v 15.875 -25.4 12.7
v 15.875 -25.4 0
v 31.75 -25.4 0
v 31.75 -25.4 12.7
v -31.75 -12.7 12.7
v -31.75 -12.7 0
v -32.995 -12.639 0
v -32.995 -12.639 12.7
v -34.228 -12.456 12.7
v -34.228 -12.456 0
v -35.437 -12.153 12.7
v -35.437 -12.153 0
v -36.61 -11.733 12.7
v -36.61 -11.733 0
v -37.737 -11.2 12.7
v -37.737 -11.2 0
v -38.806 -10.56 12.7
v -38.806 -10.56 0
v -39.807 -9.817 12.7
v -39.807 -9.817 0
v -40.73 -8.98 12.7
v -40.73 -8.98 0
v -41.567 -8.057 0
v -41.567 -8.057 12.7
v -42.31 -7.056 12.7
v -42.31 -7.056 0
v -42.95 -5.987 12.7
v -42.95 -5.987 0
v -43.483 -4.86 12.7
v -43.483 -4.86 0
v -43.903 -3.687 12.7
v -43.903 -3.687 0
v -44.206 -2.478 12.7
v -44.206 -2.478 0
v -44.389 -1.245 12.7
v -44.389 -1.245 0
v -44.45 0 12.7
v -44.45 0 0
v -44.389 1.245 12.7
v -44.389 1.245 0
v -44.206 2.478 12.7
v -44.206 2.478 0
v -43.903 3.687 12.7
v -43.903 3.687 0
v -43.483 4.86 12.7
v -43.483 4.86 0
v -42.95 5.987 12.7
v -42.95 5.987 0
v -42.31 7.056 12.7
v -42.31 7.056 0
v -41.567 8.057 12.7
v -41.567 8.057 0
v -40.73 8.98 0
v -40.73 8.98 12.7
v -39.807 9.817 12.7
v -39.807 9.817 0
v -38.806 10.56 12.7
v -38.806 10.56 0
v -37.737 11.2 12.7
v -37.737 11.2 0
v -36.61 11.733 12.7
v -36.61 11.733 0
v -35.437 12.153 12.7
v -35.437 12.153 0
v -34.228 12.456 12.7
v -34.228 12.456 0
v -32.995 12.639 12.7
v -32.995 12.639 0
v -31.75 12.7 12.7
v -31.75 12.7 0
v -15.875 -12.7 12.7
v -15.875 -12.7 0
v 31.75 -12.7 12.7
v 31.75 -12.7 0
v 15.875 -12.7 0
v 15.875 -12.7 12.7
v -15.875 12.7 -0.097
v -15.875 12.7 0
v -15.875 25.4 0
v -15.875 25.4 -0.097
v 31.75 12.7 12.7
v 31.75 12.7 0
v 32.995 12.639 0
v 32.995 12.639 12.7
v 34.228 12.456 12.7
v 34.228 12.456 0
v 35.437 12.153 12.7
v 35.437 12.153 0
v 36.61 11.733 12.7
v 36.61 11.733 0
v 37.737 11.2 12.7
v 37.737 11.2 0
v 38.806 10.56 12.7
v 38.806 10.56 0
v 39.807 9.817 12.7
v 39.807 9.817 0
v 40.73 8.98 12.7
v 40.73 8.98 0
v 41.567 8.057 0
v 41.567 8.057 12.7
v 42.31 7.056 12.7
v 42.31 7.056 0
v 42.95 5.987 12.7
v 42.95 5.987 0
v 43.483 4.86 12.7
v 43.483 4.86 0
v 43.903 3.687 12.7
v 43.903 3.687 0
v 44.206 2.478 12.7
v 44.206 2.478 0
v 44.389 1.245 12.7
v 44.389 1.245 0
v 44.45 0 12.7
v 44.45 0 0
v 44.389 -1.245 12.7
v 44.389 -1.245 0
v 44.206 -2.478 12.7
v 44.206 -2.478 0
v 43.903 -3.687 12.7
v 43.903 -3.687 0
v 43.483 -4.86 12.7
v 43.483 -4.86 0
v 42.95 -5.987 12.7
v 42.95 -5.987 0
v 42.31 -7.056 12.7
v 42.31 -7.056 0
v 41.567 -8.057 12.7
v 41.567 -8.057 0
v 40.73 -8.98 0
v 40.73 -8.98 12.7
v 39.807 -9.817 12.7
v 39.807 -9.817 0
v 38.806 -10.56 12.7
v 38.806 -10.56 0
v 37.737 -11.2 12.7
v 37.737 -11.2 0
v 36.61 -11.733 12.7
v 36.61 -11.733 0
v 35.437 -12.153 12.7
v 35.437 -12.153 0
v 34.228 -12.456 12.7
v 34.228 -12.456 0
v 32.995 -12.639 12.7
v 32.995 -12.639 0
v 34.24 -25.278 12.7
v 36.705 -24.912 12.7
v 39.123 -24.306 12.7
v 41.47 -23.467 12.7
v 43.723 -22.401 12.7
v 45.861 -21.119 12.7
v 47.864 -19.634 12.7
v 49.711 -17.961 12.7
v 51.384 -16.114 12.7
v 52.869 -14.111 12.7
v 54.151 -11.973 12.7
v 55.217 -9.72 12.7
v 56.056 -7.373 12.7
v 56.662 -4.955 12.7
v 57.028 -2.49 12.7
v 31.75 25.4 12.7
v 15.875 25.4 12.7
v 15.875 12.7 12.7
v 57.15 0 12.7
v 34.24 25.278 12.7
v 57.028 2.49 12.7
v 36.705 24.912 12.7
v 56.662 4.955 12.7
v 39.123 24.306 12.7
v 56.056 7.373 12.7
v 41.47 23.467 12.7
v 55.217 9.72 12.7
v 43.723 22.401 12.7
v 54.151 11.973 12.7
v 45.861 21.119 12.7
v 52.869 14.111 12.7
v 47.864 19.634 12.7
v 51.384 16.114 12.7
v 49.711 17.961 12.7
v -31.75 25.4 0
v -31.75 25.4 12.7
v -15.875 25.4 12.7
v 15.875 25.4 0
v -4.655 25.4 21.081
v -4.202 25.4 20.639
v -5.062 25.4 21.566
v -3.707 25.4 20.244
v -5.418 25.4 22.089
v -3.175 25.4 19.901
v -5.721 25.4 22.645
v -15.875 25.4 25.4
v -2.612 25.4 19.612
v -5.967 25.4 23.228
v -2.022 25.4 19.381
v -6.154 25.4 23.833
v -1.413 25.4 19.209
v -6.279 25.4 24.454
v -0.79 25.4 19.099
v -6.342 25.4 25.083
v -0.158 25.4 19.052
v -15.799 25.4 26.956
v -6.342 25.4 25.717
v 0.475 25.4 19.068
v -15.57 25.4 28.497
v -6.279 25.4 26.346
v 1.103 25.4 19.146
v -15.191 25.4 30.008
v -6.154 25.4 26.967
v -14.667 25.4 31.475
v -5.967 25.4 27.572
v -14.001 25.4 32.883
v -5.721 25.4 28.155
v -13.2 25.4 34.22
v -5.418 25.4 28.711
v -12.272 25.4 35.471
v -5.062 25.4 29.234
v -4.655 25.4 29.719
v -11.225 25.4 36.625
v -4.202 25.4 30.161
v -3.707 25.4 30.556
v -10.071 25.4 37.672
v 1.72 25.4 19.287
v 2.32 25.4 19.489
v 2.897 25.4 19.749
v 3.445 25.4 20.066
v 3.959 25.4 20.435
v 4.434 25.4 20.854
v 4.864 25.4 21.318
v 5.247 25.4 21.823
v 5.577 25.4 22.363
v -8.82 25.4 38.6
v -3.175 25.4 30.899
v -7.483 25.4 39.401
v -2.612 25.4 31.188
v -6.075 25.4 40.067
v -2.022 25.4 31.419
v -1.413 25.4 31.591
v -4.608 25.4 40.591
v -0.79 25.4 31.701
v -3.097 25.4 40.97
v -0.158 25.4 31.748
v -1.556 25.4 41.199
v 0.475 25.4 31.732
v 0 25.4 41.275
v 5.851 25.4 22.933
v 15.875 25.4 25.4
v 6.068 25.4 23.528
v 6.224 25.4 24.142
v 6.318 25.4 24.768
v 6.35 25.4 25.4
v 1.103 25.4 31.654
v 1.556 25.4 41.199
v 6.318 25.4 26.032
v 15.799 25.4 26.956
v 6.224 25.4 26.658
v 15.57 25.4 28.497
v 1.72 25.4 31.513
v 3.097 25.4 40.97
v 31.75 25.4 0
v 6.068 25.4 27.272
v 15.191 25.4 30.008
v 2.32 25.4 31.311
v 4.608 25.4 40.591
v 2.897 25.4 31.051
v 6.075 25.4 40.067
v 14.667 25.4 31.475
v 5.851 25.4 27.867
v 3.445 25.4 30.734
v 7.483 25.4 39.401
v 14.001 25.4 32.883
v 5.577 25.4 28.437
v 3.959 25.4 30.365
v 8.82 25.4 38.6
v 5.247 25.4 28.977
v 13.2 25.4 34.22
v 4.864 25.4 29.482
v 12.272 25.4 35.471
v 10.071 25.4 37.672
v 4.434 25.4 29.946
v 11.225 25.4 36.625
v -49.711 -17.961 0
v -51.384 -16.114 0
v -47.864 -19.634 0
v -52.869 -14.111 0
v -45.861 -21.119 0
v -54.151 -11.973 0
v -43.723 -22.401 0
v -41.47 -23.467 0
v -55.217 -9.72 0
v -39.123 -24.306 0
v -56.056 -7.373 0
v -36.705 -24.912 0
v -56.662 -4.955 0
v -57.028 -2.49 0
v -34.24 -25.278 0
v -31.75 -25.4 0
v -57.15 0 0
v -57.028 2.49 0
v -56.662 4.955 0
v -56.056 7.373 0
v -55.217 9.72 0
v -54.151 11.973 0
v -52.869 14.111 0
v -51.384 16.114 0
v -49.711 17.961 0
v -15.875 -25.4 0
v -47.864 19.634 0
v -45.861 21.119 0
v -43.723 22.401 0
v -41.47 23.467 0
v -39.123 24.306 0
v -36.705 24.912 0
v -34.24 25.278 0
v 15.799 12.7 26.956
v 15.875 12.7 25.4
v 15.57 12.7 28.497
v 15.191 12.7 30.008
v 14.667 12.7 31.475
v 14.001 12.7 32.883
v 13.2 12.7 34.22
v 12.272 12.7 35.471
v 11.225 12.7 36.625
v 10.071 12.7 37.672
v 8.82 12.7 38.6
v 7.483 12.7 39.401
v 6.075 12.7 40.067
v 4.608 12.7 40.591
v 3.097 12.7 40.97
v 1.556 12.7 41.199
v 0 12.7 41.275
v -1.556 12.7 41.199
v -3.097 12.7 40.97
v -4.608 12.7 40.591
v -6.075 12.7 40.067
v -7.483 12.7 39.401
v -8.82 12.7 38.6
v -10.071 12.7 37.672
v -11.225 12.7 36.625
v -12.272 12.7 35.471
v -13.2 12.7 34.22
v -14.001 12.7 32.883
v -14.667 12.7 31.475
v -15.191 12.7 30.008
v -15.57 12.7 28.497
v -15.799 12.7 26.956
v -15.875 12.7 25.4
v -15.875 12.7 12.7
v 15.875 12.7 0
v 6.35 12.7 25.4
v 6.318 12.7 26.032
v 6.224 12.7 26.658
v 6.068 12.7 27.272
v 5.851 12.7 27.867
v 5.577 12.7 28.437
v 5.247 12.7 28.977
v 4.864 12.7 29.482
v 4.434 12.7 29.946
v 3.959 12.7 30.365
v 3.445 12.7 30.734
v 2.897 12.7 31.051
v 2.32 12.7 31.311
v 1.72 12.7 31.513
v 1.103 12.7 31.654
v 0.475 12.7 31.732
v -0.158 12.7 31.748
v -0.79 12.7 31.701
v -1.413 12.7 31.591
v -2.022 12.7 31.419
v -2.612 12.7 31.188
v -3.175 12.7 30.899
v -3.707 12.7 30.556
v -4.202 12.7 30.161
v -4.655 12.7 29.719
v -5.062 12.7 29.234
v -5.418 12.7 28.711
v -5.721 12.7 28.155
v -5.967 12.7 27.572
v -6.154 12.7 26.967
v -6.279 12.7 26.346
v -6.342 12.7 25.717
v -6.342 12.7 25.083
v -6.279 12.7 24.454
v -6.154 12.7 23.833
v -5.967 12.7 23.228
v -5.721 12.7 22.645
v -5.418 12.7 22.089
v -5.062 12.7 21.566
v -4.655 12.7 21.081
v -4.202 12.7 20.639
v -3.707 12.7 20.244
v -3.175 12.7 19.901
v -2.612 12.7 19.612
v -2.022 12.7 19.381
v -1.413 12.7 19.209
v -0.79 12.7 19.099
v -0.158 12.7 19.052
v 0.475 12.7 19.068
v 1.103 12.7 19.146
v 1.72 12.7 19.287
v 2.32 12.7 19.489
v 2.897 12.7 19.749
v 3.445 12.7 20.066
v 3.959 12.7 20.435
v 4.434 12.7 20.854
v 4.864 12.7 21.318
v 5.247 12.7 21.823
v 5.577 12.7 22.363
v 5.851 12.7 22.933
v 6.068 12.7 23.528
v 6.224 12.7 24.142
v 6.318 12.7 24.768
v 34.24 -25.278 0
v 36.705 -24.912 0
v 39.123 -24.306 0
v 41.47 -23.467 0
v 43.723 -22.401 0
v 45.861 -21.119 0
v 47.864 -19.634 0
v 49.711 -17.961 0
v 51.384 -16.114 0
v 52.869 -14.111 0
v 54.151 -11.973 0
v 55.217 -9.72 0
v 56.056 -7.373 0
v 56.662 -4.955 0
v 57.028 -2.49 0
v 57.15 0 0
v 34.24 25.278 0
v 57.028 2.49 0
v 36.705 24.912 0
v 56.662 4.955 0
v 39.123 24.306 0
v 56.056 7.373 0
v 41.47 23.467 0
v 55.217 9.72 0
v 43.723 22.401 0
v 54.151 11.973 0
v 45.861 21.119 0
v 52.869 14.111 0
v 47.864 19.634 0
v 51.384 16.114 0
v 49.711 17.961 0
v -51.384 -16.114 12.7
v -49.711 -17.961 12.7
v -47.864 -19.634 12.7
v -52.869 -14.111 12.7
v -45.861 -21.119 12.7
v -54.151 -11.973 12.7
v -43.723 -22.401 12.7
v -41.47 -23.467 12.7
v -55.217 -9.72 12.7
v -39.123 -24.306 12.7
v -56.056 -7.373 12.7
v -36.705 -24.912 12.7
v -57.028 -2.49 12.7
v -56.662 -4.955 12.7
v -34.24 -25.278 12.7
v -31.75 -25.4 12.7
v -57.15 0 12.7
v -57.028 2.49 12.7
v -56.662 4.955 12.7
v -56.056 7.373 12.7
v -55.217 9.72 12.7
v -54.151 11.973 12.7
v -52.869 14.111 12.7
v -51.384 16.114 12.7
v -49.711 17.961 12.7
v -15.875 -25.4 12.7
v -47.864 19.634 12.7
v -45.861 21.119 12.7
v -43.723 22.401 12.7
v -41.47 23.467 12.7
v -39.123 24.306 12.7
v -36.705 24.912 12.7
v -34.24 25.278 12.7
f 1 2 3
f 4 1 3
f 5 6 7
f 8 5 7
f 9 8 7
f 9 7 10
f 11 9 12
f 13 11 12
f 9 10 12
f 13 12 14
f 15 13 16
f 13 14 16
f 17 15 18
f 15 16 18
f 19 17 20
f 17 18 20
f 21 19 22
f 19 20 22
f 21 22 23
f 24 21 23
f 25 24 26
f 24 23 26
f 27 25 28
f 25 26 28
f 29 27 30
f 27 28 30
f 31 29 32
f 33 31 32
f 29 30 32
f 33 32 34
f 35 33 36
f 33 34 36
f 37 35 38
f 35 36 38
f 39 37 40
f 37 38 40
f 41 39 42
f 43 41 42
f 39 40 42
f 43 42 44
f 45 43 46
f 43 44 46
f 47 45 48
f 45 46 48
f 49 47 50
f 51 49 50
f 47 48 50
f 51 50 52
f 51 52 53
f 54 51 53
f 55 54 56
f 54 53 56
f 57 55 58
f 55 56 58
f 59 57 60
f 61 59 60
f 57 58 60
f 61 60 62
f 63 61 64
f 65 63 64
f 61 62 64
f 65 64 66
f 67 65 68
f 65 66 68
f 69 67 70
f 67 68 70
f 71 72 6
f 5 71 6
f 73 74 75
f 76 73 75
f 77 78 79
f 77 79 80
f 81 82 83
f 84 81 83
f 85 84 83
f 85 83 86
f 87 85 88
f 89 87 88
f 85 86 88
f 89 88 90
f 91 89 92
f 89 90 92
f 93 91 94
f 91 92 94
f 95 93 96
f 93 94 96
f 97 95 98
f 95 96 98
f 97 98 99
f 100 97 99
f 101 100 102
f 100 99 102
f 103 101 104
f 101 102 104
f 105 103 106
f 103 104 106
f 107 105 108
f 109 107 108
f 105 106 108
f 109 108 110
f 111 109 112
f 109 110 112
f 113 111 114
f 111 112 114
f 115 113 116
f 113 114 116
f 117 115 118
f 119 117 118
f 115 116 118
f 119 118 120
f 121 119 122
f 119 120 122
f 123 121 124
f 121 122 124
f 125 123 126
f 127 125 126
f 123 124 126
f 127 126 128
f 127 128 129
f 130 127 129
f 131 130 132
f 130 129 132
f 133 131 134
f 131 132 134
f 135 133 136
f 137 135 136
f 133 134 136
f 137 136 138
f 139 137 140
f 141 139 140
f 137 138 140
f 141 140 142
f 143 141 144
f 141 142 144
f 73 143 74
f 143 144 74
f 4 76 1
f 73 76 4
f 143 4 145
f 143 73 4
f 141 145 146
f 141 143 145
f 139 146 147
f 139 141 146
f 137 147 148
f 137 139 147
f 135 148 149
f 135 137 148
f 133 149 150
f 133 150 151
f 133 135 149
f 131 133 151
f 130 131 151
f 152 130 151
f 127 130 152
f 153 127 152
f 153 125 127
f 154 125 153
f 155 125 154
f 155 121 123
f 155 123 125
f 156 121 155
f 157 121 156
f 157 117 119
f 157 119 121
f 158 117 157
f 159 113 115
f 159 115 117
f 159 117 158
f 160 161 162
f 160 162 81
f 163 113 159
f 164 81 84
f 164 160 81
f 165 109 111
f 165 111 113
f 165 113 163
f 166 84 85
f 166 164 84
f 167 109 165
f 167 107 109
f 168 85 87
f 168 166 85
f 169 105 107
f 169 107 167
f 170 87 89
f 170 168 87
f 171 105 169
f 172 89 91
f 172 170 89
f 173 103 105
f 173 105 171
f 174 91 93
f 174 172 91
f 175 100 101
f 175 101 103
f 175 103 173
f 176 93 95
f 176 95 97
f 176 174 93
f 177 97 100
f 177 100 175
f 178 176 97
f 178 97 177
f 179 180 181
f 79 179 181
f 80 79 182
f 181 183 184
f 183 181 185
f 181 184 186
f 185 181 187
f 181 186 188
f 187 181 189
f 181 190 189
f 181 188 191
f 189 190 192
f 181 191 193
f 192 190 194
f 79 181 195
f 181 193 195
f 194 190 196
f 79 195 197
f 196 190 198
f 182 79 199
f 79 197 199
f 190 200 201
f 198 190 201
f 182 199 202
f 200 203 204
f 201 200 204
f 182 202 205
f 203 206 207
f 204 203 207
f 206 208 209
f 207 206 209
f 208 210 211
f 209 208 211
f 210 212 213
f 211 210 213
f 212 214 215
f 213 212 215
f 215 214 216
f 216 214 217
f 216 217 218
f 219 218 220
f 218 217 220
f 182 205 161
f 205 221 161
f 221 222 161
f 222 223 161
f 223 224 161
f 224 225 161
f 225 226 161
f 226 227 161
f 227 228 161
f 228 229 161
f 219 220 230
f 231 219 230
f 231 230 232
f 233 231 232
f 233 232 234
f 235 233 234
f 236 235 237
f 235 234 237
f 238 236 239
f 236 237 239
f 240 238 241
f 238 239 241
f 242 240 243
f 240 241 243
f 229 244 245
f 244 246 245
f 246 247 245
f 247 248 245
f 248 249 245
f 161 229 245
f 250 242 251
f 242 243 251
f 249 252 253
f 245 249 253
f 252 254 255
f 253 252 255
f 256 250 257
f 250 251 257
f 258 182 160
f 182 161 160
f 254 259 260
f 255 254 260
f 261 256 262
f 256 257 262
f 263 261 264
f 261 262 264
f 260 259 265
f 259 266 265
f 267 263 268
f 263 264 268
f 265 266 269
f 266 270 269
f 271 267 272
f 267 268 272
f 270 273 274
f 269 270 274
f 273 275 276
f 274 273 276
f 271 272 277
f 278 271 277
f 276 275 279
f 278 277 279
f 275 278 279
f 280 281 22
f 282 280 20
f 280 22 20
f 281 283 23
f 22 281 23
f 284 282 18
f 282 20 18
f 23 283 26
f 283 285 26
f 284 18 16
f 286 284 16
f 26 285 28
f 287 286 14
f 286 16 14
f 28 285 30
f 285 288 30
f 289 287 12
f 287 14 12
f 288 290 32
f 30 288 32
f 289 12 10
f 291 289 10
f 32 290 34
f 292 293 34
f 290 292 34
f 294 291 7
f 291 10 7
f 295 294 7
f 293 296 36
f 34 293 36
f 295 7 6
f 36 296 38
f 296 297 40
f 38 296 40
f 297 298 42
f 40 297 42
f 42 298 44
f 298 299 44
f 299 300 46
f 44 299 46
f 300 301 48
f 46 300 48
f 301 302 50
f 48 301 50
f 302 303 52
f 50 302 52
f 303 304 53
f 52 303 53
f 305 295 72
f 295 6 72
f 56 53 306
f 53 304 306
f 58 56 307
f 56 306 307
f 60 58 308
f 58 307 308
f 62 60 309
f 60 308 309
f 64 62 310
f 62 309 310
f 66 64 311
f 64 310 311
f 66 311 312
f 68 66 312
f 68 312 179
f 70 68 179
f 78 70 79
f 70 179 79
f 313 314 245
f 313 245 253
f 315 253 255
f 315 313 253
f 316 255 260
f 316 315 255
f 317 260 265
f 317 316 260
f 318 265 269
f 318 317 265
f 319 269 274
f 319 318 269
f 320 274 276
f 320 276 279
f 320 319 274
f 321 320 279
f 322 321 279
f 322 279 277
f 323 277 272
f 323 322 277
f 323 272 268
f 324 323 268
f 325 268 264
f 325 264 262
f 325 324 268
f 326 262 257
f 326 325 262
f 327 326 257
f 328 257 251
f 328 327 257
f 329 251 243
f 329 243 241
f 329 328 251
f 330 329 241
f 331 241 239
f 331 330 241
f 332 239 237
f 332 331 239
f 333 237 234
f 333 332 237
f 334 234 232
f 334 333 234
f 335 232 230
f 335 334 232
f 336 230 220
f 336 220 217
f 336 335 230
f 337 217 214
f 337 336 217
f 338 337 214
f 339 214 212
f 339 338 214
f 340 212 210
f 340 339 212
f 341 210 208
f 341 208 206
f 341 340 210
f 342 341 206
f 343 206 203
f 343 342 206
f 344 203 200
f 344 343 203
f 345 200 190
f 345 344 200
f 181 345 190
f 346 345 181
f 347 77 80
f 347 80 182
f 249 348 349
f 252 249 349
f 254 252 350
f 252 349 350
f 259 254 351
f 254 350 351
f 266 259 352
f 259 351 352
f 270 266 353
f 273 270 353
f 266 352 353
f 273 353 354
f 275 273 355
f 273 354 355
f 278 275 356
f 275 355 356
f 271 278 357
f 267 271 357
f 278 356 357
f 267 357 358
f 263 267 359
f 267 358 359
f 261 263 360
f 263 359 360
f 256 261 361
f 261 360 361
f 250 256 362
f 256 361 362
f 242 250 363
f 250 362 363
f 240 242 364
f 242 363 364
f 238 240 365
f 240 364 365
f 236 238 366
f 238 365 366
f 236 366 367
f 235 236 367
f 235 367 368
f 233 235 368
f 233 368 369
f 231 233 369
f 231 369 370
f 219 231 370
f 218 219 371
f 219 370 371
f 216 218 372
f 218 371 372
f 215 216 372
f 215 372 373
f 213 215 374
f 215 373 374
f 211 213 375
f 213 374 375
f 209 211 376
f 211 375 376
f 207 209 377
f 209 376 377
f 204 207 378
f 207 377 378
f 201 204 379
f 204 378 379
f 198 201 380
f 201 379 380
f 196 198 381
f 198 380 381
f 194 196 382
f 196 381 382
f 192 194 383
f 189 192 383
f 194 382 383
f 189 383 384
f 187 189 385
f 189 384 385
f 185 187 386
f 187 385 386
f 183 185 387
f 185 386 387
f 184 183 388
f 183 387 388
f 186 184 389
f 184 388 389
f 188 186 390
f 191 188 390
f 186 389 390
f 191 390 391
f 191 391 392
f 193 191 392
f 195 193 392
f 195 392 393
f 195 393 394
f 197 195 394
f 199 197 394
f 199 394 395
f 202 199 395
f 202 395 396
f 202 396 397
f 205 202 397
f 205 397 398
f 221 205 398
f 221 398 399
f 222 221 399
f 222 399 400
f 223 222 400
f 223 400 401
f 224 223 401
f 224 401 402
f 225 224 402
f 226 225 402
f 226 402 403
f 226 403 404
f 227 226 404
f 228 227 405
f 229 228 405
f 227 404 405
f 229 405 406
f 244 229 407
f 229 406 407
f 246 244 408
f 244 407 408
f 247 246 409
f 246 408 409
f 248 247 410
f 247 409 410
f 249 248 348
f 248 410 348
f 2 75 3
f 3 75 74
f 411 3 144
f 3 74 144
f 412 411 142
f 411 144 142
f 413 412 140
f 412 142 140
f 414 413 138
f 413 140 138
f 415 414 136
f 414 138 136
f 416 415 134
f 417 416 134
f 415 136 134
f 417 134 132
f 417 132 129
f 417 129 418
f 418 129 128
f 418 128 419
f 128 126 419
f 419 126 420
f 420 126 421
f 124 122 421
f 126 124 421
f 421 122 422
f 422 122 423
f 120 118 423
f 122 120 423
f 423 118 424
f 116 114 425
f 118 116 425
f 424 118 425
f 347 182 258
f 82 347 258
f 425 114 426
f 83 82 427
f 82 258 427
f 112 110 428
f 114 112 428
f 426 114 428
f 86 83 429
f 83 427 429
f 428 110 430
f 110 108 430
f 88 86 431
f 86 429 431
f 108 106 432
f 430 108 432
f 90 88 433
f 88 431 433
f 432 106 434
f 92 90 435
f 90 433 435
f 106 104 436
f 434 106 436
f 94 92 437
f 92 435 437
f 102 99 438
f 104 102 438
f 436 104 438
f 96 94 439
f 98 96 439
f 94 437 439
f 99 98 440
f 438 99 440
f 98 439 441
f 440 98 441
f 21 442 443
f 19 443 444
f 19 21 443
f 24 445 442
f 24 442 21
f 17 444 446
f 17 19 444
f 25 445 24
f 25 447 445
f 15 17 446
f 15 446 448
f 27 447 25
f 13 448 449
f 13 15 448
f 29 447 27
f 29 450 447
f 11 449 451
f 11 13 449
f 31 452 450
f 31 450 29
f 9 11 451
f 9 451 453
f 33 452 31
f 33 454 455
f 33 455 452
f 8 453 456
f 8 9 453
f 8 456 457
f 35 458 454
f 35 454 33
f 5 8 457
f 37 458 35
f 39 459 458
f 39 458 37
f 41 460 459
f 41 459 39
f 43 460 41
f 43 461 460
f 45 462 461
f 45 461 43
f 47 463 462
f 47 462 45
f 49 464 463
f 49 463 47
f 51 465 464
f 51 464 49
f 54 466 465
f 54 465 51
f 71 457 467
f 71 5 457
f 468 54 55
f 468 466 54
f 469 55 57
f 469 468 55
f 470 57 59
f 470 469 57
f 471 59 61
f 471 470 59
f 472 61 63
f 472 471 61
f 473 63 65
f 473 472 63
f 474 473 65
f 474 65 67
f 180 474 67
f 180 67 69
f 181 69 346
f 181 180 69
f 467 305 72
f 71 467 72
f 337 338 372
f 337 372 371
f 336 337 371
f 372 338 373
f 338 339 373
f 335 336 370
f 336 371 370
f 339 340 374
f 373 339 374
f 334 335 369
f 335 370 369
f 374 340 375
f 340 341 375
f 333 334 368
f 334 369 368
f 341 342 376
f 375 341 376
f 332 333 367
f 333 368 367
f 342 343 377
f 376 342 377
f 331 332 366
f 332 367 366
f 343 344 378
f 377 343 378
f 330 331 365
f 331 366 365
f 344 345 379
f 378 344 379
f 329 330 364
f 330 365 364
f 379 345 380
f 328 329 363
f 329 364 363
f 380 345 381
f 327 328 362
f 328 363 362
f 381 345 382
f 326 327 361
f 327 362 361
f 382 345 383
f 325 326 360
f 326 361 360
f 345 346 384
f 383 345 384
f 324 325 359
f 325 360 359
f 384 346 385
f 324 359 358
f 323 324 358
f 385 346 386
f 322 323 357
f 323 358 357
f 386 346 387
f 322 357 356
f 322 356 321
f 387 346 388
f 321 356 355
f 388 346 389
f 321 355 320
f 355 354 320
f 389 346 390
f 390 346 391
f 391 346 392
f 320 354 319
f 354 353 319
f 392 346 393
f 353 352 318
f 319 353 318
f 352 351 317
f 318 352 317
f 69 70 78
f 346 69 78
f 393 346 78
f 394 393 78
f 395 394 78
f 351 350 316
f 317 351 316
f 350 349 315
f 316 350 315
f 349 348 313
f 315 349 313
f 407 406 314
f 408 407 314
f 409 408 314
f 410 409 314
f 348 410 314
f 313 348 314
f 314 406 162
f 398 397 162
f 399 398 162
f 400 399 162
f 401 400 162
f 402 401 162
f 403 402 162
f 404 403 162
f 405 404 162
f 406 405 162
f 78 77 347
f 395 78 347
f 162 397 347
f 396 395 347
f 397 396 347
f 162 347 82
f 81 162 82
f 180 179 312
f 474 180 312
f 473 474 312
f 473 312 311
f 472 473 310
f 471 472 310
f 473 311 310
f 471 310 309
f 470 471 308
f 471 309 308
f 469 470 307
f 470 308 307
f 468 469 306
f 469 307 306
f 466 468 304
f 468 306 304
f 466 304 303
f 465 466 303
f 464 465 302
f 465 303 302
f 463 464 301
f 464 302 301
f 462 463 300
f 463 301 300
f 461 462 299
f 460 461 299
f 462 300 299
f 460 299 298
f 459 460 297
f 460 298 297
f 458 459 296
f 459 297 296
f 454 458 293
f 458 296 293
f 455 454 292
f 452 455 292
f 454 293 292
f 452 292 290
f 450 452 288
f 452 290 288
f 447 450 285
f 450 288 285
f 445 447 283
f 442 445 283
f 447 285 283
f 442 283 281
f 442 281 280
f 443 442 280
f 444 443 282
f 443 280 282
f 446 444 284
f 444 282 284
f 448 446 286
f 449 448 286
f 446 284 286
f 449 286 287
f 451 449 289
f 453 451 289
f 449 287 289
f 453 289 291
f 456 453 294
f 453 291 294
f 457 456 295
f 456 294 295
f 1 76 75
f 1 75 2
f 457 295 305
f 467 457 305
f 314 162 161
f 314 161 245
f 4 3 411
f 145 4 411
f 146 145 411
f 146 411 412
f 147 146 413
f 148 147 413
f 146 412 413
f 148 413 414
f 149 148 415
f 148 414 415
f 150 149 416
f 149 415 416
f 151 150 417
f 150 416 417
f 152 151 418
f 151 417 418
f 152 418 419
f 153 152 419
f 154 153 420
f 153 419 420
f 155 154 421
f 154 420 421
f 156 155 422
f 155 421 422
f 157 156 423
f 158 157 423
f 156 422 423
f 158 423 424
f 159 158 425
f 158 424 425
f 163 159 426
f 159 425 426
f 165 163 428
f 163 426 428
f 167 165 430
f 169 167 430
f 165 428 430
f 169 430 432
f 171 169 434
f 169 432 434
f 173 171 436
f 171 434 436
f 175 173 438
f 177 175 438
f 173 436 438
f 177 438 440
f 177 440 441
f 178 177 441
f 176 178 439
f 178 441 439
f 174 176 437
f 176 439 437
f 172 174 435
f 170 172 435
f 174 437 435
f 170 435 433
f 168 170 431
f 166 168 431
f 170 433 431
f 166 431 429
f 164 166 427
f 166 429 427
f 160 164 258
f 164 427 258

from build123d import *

# Parameters (mm, degrees)
F1_DEPTH = 12.7
F2_R     = 6.35
F3_DEPTH = 12.7


with BuildPart() as f1:
    # F0 (on Top) → F1 (new body)
    with BuildSketch(Plane.XY):
        with BuildLine():
            Line((15.875, -25.4), (31.75, -25.4))
            ThreePointArc((31.75, -25.4), (57.15, 0), (31.75, 25.4))
            Line((31.75, 25.4), (0, 25.4))
            Line((0, 25.4), (-31.75, 25.4))
            ThreePointArc((-31.75, 25.4), (-57.15, 0), (-31.75, -25.4))
            Line((-31.75, -25.4), (-15.875, -25.4))
            Line((-15.875, -25.4), (-15.875, -12.7))
            Line((-15.875, -12.7), (-31.75, -12.7))
            ThreePointArc((-31.75, -12.7), (-44.45, 0), (-31.75, 12.7))
            Line((-31.75, 12.7), (0, 12.7))
            Line((0, 12.7), (31.75, 12.7))
            ThreePointArc((31.75, 12.7), (44.45, 0), (31.75, -12.7))
            Line((31.75, -12.7), (15.875, -12.7))
            Line((15.875, -12.7), (15.875, -25.4))
        make_face()
    extrude(amount=F1_DEPTH)

    # F2 (on face) → F3 (join)
    with BuildSketch(Plane.XZ.offset(-12.7)):
        with BuildLine():
            Line((15.875, 0), (15.875, 25.4))
            ThreePointArc((15.875, 25.4), (0, 41.275), (-15.875, 25.4))
            Line((-15.875, 25.4), (-15.875, -0.097406))
            Line((-15.875, -0.097406), (15.875, 0))
        make_face()
        with Locations((0, 25.4)):
            Circle(F2_R, mode=Mode.SUBTRACT)
    extrude(amount=-F3_DEPTH)


solid = f1.part
